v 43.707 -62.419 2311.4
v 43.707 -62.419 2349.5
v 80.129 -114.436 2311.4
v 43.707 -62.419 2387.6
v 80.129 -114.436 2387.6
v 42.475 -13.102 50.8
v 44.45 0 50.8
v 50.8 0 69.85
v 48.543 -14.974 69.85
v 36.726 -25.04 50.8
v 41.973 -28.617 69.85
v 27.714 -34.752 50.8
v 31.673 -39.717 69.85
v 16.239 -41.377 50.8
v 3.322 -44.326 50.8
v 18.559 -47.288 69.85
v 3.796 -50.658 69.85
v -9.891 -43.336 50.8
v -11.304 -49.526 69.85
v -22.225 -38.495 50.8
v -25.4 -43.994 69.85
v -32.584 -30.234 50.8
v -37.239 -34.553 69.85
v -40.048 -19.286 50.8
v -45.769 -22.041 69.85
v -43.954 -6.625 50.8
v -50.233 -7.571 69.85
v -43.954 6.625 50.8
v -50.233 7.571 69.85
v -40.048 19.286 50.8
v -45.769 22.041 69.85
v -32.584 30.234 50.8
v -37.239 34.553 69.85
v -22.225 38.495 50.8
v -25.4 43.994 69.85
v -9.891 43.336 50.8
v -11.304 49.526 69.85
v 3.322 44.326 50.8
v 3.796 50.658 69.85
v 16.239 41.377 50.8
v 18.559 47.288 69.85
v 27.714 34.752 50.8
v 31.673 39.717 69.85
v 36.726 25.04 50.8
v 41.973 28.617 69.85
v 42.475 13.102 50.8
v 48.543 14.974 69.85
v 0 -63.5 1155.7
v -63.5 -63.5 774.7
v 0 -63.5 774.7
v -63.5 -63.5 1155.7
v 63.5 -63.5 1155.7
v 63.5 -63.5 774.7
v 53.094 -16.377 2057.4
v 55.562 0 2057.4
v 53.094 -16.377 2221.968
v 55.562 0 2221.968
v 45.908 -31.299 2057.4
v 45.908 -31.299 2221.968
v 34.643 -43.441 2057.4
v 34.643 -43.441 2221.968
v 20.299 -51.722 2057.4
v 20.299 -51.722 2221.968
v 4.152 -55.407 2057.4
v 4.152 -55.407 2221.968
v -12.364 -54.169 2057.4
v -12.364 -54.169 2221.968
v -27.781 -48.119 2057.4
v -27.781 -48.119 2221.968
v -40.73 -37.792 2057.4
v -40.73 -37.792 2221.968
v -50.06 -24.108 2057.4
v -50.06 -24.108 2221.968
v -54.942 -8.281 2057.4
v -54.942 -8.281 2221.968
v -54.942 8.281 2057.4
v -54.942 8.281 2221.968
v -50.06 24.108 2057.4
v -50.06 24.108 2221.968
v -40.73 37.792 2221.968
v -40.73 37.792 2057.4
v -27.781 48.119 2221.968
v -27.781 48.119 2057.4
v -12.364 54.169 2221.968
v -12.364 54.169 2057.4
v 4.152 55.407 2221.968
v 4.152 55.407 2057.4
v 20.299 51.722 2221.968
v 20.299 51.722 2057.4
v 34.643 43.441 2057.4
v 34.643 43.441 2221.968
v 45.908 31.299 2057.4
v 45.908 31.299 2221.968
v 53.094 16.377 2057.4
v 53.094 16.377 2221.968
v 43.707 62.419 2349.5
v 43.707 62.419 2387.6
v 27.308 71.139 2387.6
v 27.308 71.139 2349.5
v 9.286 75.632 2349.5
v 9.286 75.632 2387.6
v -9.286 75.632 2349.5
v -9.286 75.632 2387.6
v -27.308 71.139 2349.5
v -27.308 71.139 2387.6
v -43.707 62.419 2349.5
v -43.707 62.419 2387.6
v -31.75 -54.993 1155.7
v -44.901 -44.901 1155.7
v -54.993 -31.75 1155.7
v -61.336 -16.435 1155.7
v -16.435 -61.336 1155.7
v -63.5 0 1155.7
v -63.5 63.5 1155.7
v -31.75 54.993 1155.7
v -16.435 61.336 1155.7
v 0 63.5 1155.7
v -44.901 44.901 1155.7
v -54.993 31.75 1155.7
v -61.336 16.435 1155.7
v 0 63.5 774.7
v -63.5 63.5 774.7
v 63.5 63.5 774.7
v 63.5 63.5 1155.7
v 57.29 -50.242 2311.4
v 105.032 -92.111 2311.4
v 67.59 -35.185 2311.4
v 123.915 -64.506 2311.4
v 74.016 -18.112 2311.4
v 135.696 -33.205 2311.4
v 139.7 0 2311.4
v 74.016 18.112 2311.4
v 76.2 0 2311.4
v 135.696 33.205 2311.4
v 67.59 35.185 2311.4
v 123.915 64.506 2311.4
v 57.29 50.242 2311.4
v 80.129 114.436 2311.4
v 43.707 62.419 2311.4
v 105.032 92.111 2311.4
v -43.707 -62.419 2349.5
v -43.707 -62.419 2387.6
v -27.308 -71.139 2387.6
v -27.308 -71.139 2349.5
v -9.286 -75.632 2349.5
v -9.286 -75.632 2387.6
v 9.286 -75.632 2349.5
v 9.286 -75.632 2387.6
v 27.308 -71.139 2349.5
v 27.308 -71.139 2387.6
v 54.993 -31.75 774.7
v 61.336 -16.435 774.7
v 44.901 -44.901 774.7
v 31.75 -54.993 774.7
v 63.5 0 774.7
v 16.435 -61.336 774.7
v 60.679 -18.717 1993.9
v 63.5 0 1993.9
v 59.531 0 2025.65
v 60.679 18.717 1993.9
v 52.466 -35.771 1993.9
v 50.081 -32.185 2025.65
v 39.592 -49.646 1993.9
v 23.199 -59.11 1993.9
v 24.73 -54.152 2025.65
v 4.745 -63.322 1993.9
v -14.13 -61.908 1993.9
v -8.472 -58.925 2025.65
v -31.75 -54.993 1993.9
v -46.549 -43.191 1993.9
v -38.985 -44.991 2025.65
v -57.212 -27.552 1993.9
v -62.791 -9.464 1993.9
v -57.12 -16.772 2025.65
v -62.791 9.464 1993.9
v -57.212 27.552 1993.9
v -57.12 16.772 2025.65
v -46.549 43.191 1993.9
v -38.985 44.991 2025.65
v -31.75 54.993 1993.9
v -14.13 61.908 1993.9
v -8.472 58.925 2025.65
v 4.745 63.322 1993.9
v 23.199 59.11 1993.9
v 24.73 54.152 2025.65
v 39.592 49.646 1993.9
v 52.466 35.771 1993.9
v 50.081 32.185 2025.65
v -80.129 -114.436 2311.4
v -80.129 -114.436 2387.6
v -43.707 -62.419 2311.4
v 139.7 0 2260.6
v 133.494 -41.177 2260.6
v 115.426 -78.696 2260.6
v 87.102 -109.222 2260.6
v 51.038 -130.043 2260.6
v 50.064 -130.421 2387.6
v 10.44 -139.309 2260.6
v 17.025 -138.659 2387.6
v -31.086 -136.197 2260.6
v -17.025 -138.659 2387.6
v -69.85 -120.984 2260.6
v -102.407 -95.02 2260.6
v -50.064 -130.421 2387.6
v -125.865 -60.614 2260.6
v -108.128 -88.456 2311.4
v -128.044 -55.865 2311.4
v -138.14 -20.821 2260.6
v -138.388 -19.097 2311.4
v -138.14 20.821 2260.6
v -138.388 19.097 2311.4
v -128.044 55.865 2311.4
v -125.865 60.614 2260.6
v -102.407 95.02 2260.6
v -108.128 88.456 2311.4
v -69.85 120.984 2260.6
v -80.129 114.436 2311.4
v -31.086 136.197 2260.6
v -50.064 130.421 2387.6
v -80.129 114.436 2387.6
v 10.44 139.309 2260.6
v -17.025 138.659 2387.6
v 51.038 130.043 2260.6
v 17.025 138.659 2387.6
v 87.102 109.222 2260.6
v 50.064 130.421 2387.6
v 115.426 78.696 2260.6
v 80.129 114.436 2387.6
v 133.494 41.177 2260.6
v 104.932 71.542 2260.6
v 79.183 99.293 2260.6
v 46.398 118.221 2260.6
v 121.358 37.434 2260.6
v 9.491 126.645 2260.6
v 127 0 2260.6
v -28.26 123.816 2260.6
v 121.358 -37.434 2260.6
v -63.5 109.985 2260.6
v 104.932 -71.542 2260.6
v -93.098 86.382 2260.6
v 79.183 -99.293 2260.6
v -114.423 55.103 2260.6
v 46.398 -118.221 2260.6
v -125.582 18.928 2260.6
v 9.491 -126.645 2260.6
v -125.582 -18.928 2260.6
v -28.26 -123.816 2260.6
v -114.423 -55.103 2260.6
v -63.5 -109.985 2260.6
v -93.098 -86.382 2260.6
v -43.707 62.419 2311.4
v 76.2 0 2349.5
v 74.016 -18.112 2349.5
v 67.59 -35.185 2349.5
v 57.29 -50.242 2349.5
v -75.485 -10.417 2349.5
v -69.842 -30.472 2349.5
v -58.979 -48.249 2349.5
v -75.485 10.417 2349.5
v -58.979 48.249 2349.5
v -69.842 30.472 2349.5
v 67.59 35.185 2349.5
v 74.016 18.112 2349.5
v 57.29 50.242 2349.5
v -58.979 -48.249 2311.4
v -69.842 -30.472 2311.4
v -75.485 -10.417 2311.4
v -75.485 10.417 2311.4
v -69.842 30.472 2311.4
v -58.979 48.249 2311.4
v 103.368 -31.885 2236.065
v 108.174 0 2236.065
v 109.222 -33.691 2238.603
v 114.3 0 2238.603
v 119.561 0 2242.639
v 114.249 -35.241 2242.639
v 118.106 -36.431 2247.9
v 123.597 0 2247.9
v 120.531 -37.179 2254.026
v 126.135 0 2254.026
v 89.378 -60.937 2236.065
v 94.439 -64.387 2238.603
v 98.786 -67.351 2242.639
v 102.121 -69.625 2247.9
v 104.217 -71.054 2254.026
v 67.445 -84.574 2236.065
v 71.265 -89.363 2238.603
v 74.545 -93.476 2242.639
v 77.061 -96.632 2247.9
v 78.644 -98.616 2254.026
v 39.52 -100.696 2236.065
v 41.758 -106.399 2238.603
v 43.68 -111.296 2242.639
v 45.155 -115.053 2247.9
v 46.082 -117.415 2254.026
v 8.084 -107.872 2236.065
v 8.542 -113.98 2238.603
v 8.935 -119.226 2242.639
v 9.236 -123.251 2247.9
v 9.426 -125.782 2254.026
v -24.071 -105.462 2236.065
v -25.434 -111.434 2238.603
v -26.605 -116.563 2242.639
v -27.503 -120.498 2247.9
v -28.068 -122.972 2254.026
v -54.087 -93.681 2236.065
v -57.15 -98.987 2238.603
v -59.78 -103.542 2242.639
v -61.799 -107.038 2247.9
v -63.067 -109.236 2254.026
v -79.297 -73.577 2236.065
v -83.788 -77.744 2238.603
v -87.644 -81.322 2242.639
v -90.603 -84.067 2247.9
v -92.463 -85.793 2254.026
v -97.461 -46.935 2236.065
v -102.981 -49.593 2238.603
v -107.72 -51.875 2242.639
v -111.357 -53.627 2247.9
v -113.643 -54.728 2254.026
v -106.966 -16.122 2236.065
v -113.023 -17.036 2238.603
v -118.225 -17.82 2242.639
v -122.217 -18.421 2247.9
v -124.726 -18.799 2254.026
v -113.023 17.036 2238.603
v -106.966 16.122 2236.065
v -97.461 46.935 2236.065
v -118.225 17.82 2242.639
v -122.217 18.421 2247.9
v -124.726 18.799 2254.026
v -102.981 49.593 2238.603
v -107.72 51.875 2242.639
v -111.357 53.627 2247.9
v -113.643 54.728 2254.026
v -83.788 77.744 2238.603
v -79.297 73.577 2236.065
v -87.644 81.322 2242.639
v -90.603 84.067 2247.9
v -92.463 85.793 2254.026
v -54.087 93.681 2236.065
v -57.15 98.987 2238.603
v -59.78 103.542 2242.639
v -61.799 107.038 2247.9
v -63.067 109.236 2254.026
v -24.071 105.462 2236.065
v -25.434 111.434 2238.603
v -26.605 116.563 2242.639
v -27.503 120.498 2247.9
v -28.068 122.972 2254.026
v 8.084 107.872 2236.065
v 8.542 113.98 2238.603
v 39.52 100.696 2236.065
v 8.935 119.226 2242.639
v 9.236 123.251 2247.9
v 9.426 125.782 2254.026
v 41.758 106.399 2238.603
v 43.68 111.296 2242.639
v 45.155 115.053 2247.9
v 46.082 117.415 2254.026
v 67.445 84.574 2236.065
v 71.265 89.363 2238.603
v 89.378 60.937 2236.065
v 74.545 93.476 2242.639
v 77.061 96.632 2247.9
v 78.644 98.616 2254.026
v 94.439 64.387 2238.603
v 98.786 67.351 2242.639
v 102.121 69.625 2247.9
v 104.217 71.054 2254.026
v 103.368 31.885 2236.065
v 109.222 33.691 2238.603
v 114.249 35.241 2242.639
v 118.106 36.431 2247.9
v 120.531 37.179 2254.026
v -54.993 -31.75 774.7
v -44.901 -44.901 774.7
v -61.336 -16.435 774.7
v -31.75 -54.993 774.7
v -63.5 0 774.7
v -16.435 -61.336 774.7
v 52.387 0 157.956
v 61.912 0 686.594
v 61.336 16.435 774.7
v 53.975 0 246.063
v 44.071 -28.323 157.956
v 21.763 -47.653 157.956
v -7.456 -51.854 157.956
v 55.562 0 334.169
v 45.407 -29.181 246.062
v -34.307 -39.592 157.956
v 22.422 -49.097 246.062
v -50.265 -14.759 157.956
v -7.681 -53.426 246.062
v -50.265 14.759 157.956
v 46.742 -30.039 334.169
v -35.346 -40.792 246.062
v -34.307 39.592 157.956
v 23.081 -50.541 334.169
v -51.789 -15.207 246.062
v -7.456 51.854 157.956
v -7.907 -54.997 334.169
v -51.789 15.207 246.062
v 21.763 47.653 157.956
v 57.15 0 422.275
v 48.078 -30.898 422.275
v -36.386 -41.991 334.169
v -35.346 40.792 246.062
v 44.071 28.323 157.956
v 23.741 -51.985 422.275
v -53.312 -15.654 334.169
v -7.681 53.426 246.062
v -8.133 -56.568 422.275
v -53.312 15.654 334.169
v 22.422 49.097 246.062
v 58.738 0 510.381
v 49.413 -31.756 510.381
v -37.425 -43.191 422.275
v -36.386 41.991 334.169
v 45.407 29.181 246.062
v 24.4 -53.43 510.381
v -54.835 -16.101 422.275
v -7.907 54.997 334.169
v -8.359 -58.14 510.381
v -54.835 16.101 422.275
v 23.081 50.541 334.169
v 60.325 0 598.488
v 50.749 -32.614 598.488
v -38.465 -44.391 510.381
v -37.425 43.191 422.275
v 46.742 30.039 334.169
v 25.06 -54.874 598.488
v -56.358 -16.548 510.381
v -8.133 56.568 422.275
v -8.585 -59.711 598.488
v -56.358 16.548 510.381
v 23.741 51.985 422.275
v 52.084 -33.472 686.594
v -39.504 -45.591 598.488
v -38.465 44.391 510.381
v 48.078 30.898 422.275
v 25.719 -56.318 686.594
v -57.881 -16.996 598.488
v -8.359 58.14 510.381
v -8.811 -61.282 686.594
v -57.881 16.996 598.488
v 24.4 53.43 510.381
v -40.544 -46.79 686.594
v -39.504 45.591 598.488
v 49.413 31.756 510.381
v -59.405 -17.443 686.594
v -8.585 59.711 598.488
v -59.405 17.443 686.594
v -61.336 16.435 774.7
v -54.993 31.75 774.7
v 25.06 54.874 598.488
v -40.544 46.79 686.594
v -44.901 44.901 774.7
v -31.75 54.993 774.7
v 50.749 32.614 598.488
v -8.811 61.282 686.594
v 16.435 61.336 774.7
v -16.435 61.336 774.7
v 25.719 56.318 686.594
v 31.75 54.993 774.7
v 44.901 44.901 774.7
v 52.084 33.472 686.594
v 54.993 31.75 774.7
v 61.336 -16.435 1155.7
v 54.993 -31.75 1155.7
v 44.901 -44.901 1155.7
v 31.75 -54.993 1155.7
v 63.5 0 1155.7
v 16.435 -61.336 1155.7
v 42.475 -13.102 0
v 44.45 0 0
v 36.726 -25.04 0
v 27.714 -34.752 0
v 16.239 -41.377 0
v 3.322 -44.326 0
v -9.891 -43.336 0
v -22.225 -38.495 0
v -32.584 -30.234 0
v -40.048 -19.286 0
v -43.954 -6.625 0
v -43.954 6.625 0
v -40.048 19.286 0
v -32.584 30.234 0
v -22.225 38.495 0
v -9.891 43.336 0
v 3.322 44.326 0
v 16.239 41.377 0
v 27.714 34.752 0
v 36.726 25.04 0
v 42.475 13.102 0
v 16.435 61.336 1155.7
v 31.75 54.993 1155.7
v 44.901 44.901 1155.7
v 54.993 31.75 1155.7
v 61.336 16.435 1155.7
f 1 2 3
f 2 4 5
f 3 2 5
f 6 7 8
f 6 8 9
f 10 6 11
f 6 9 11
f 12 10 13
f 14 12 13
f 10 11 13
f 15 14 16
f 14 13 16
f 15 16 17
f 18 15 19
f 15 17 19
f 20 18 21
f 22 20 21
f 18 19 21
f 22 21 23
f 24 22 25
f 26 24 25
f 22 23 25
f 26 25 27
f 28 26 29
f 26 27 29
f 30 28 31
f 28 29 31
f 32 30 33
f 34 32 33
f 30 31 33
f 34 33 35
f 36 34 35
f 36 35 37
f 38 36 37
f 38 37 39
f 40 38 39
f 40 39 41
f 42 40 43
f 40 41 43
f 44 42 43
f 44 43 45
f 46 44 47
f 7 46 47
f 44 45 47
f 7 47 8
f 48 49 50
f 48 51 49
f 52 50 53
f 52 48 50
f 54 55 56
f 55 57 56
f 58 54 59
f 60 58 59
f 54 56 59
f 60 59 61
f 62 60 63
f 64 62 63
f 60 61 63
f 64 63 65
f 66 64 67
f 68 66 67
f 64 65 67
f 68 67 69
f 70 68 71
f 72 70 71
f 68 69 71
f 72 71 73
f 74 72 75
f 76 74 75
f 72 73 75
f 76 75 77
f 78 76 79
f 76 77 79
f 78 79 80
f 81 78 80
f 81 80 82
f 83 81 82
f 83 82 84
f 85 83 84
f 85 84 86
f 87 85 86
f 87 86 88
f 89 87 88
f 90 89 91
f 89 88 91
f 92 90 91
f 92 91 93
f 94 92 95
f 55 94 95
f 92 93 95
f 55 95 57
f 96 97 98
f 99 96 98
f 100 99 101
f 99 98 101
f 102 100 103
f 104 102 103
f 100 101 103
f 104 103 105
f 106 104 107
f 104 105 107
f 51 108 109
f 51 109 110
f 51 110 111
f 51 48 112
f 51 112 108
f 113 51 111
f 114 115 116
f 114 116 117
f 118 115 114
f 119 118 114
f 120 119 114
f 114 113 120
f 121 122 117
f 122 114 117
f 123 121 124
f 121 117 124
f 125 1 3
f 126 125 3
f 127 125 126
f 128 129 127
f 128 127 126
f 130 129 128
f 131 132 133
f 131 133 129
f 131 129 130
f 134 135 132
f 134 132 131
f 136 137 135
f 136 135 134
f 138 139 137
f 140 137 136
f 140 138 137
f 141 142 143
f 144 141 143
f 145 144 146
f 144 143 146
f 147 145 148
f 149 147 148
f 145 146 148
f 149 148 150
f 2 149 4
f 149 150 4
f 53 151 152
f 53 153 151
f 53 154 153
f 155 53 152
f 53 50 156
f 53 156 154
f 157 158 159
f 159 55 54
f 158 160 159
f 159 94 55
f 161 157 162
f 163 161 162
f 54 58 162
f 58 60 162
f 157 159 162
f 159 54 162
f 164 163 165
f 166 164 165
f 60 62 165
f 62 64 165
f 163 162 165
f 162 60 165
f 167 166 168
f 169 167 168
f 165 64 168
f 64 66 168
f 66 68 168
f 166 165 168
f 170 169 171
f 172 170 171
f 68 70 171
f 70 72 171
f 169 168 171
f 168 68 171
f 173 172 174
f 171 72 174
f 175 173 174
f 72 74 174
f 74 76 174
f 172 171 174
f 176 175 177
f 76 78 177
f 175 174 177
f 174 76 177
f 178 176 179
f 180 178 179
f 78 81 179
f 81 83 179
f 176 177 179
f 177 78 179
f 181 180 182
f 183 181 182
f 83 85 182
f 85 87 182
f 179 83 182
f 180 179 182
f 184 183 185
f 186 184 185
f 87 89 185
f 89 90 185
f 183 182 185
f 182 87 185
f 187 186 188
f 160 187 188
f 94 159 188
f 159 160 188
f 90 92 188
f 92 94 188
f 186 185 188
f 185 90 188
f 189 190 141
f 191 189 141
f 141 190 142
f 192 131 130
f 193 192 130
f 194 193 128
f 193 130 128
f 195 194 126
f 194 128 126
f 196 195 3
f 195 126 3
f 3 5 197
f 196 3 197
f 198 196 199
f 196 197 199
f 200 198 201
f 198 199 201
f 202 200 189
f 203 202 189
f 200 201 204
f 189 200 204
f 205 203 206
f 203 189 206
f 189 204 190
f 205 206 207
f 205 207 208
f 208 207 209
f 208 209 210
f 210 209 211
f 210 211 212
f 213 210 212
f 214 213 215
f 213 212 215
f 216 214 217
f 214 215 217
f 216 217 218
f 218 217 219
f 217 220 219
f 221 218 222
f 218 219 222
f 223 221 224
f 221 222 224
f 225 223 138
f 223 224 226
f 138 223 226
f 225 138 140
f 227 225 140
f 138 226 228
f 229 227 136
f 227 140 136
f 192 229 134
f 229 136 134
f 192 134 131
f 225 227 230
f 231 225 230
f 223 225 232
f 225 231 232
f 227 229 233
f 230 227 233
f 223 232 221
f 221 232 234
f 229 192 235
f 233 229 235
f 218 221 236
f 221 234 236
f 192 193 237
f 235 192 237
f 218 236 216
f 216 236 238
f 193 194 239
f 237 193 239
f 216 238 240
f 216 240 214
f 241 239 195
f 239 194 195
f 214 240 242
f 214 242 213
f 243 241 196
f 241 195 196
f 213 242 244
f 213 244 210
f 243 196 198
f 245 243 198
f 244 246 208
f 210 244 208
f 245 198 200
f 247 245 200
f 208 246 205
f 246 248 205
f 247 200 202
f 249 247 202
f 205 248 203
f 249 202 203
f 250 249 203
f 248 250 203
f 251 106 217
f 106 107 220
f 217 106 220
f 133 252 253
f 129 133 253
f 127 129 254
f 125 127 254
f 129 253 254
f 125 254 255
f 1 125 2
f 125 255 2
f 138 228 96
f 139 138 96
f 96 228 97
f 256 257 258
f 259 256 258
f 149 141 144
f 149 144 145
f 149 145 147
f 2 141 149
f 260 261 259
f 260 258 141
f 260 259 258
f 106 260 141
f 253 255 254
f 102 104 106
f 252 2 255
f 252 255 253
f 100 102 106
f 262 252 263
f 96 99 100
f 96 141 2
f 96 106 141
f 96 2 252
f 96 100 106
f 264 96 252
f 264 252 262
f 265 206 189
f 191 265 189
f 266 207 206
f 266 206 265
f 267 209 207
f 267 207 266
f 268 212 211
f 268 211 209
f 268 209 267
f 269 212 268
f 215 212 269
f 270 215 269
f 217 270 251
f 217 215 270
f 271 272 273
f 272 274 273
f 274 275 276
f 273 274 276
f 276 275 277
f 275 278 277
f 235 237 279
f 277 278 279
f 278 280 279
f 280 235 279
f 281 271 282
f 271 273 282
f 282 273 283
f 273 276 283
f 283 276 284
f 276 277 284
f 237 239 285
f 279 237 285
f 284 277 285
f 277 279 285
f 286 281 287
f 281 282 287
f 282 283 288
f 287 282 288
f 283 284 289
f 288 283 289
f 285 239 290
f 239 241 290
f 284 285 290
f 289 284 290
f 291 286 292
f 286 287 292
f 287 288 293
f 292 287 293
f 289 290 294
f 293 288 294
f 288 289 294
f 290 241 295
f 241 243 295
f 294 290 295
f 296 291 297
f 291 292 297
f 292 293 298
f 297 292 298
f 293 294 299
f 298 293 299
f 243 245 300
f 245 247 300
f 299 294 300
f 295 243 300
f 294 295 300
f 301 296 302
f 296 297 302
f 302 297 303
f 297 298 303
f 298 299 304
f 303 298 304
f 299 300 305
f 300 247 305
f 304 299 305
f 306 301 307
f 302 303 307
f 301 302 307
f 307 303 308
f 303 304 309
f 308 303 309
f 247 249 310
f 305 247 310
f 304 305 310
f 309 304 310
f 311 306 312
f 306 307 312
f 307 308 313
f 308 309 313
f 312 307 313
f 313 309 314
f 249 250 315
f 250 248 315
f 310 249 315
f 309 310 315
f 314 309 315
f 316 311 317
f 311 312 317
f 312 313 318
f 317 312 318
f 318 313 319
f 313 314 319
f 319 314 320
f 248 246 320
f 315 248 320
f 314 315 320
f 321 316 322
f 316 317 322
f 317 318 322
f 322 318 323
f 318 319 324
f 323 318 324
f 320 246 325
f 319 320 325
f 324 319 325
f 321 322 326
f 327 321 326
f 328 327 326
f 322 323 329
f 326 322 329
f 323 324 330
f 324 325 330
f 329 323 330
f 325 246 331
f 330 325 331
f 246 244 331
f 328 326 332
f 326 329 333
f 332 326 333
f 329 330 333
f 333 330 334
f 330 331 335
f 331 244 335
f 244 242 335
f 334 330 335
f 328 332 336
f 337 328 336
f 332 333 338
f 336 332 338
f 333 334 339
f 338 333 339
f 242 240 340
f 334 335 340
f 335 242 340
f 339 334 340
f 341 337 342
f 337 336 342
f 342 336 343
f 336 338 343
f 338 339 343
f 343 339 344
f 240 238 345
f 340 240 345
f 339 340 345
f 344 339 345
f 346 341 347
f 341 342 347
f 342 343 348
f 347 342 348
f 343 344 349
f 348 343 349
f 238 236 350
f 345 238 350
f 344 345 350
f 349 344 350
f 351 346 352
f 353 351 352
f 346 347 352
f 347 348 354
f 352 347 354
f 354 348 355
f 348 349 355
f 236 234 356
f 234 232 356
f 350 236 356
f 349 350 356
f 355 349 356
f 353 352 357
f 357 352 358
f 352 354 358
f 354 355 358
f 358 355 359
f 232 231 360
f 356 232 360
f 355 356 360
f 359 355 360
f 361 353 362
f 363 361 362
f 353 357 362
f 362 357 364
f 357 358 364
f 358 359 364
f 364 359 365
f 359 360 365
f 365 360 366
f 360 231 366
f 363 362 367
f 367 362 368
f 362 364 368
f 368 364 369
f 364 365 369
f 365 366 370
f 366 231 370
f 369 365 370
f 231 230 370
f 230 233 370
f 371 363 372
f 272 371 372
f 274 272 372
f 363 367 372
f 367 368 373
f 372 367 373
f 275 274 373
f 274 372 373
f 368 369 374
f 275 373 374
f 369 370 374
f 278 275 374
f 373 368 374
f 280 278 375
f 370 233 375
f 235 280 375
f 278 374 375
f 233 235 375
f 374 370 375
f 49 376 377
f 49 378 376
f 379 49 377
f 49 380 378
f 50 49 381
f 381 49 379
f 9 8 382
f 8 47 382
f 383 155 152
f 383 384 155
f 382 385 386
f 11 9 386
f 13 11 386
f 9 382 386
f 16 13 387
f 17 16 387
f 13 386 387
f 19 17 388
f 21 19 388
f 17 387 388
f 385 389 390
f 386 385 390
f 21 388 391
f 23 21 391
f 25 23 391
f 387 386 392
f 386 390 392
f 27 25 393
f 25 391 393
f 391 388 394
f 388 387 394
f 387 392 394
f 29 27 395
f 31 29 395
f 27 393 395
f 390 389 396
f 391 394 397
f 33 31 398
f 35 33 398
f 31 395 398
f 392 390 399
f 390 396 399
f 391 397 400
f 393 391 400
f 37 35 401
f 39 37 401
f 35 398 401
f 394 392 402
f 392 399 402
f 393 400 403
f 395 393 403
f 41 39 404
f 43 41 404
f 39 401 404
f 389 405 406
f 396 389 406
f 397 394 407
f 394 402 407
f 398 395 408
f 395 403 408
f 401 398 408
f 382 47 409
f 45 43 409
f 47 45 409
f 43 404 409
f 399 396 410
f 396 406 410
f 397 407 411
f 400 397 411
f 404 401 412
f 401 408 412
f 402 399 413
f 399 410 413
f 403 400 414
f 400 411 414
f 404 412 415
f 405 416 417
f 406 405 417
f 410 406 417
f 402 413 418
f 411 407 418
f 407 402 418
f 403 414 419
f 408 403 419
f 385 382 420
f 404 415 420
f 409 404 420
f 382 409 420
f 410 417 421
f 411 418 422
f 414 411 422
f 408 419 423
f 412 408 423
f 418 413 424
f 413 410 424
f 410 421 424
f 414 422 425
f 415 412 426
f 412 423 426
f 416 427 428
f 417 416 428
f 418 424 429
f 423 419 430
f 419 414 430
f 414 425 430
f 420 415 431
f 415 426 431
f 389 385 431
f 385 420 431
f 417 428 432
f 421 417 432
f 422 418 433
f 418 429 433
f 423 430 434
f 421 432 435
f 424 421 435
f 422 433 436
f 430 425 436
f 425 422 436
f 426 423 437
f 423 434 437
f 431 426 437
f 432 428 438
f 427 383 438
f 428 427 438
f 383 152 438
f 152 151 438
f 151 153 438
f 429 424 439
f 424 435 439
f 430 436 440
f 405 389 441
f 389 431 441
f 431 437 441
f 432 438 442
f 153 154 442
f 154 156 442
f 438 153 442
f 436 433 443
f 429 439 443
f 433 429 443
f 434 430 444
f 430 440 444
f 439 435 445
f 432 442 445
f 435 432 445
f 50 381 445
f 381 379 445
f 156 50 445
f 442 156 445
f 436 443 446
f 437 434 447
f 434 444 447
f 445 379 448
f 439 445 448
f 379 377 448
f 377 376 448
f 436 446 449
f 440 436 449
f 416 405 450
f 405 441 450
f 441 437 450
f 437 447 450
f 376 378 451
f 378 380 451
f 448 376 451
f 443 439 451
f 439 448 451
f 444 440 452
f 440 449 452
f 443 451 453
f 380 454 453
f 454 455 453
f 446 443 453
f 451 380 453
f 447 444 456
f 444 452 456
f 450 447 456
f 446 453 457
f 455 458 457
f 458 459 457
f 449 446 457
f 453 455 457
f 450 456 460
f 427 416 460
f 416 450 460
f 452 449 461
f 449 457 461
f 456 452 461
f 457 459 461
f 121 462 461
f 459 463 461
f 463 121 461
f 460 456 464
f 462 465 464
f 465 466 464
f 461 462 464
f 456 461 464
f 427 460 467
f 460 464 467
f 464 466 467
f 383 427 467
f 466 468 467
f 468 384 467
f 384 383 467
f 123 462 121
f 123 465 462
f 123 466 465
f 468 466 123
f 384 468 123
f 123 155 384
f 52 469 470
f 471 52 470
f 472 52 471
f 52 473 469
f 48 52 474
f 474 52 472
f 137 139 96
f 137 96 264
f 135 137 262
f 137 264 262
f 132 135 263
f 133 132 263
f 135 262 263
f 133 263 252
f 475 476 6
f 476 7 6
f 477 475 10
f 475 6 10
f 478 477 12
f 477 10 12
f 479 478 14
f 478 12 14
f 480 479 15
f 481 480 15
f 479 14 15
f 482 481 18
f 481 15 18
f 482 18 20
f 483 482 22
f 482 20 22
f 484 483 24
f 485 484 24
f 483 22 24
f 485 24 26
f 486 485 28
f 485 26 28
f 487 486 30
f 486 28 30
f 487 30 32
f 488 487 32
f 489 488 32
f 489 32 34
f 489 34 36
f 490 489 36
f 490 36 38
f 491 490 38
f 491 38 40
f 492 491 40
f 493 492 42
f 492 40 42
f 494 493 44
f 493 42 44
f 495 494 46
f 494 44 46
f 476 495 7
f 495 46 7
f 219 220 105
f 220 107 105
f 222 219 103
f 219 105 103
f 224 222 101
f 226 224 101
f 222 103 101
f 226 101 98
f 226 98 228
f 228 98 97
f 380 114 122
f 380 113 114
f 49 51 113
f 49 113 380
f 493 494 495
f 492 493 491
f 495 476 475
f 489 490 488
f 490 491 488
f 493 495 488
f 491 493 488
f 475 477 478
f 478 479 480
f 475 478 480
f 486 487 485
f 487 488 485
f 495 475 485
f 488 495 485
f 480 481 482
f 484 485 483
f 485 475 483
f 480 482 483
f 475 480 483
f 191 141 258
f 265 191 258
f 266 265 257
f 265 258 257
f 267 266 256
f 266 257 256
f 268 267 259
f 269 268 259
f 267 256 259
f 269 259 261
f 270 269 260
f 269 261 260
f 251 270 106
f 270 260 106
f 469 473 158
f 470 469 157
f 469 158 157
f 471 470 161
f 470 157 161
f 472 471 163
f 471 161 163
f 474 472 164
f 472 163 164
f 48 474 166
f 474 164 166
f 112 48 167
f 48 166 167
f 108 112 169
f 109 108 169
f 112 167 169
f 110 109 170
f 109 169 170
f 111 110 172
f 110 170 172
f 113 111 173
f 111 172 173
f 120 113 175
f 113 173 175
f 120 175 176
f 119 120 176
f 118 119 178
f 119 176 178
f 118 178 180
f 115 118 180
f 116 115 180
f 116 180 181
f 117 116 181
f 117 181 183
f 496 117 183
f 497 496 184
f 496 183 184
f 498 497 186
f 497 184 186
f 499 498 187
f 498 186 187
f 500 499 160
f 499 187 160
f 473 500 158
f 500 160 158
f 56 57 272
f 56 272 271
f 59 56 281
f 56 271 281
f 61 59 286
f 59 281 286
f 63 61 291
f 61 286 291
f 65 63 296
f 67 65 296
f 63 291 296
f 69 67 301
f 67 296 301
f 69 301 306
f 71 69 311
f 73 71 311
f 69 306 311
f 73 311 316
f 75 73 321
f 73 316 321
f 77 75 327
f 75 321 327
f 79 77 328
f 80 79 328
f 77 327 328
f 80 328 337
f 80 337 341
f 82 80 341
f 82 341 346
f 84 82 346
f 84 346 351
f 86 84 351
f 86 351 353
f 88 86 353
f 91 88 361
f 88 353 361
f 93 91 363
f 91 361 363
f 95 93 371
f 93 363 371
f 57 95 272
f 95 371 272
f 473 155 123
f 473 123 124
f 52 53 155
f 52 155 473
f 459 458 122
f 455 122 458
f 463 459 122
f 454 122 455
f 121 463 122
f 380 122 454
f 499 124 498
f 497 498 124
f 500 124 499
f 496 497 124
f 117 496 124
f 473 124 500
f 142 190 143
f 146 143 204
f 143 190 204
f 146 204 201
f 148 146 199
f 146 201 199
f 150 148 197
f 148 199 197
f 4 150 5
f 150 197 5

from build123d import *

# Parameters (mm, degrees)
F2_DEPTH = 63.5
F4_DEPTH = 38.1
F5_DEPTH = 76.2


with BuildPart() as f1:
    # F0 (on Front) → F1 (revolve)
    with BuildSketch(Plane.XZ):
        with BuildLine():
            Line((0, 1155.7), (63.5, 1155.7))
            Line((63.5, 1155.7), (63.5, 1993.9))
            Line((63.5, 1993.9), (55.5625, 2057.4))
            Line((55.5625, 2057.4), (55.5625, 2221.968274071))
            Line((55.5625, 2221.968274071), (108.1740037456, 2236.0654840123))
            ThreePointArc((108.1740037456, 2236.0654840123), (121.7511748434, 2245.1374597032), (127, 2260.6))
            Line((127, 2260.6), (139.7, 2260.6))
            Line((139.7, 2260.6), (139.7, 2387.6))
            Line((139.7, 2387.6), (0, 2387.6))
            Line((0, 2387.6), (0, 1155.7))
        make_face()
    revolve(axis=Axis((0, 0, 1771.65), (0, 0, -1)))



with BuildPart() as f1b:
    # F0 (on Front) → F1, piece 2 (revolve)
    with BuildSketch(Plane.XZ):
        Polygon((0, 774.7), (0, 0), (44.45, 0), (44.45, 50.8), (50.8, 69.85), (63.5, 774.7), align=None)
    revolve(axis=Axis((0, 0, 1771.65), (0, 0, -1)))


with BuildPart() as f1_1:
    add(f1.part)

    add(f1b.part)  # F2 merges F1b
    # F0 (on Front) → F2 (join, symmetric)
    with BuildSketch(Plane.XZ):
        Polygon((-63.5, 774.7), (0, 774.7), (63.5, 774.7), (63.5, 1155.7), (0, 1155.7), (-63.5, 1155.7), align=None)
    extrude(amount=F2_DEPTH, both=True)

    # F3 (on face) → F4 (cut)
    with BuildSketch(Plane.XY.offset(2387.6)):
        with BuildLine():
            ThreePointArc((43.7065244499, -62.4193857748), (67.5902254882, -35.1852443285), (76.2, 0))
            ThreePointArc((76.2, 0), (67.5902254882, 35.1852443285), (43.7065244499, 62.4193857748))
            ThreePointArc((43.7065244499, 62.4193857748), (0, 76.2), (-43.7065244499, 62.4193857748))
            ThreePointArc((-43.7065244499, 62.4193857748), (-76.2, 0), (-43.7065244499, -62.4193857748))
            ThreePointArc((-43.7065244499, -62.4193857748), (0, -76.2), (43.7065244499, -62.4193857748))
        make_face()
    extrude(amount=-F4_DEPTH, mode=Mode.SUBTRACT)

    # F3 (on face) → F5 (cut)
    with BuildSketch(Plane.XY.offset(2387.6)):
        with BuildLine():
            ThreePointArc((-43.7065244499, -62.4193857748), (-76.2, 0), (-43.7065244499, 62.4193857748))
            Line((-43.7065244499, 62.4193857748), (-80.1286281582, 114.4355405872))
            ThreePointArc((-80.1286281582, 114.4355405872), (-139.7, 0), (-80.1286281582, -114.4355405872))
            Line((-80.1286281582, -114.4355405872), (-43.7065244499, -62.4193857748))
        make_face()
        with BuildLine():
            ThreePointArc((43.7065244499, 62.4193857748), (67.5902254882, 35.1852443285), (76.2, 0))
            ThreePointArc((76.2, 0), (67.5902254882, -35.1852443285), (43.7065244499, -62.4193857748))
            Line((43.7065244499, -62.4193857748), (80.1286281582, -114.4355405872))
            ThreePointArc((80.1286281582, -114.4355405872), (123.915413395, -64.5062812689), (139.7, 0))
            ThreePointArc((139.7, 0), (123.915413395, 64.5062812689), (80.1286281582, 114.4355405872))
            Line((80.1286281582, 114.4355405872), (43.7065244499, 62.4193857748))
        make_face()
    extrude(amount=-F5_DEPTH, mode=Mode.SUBTRACT)


solid = f1_1.part
